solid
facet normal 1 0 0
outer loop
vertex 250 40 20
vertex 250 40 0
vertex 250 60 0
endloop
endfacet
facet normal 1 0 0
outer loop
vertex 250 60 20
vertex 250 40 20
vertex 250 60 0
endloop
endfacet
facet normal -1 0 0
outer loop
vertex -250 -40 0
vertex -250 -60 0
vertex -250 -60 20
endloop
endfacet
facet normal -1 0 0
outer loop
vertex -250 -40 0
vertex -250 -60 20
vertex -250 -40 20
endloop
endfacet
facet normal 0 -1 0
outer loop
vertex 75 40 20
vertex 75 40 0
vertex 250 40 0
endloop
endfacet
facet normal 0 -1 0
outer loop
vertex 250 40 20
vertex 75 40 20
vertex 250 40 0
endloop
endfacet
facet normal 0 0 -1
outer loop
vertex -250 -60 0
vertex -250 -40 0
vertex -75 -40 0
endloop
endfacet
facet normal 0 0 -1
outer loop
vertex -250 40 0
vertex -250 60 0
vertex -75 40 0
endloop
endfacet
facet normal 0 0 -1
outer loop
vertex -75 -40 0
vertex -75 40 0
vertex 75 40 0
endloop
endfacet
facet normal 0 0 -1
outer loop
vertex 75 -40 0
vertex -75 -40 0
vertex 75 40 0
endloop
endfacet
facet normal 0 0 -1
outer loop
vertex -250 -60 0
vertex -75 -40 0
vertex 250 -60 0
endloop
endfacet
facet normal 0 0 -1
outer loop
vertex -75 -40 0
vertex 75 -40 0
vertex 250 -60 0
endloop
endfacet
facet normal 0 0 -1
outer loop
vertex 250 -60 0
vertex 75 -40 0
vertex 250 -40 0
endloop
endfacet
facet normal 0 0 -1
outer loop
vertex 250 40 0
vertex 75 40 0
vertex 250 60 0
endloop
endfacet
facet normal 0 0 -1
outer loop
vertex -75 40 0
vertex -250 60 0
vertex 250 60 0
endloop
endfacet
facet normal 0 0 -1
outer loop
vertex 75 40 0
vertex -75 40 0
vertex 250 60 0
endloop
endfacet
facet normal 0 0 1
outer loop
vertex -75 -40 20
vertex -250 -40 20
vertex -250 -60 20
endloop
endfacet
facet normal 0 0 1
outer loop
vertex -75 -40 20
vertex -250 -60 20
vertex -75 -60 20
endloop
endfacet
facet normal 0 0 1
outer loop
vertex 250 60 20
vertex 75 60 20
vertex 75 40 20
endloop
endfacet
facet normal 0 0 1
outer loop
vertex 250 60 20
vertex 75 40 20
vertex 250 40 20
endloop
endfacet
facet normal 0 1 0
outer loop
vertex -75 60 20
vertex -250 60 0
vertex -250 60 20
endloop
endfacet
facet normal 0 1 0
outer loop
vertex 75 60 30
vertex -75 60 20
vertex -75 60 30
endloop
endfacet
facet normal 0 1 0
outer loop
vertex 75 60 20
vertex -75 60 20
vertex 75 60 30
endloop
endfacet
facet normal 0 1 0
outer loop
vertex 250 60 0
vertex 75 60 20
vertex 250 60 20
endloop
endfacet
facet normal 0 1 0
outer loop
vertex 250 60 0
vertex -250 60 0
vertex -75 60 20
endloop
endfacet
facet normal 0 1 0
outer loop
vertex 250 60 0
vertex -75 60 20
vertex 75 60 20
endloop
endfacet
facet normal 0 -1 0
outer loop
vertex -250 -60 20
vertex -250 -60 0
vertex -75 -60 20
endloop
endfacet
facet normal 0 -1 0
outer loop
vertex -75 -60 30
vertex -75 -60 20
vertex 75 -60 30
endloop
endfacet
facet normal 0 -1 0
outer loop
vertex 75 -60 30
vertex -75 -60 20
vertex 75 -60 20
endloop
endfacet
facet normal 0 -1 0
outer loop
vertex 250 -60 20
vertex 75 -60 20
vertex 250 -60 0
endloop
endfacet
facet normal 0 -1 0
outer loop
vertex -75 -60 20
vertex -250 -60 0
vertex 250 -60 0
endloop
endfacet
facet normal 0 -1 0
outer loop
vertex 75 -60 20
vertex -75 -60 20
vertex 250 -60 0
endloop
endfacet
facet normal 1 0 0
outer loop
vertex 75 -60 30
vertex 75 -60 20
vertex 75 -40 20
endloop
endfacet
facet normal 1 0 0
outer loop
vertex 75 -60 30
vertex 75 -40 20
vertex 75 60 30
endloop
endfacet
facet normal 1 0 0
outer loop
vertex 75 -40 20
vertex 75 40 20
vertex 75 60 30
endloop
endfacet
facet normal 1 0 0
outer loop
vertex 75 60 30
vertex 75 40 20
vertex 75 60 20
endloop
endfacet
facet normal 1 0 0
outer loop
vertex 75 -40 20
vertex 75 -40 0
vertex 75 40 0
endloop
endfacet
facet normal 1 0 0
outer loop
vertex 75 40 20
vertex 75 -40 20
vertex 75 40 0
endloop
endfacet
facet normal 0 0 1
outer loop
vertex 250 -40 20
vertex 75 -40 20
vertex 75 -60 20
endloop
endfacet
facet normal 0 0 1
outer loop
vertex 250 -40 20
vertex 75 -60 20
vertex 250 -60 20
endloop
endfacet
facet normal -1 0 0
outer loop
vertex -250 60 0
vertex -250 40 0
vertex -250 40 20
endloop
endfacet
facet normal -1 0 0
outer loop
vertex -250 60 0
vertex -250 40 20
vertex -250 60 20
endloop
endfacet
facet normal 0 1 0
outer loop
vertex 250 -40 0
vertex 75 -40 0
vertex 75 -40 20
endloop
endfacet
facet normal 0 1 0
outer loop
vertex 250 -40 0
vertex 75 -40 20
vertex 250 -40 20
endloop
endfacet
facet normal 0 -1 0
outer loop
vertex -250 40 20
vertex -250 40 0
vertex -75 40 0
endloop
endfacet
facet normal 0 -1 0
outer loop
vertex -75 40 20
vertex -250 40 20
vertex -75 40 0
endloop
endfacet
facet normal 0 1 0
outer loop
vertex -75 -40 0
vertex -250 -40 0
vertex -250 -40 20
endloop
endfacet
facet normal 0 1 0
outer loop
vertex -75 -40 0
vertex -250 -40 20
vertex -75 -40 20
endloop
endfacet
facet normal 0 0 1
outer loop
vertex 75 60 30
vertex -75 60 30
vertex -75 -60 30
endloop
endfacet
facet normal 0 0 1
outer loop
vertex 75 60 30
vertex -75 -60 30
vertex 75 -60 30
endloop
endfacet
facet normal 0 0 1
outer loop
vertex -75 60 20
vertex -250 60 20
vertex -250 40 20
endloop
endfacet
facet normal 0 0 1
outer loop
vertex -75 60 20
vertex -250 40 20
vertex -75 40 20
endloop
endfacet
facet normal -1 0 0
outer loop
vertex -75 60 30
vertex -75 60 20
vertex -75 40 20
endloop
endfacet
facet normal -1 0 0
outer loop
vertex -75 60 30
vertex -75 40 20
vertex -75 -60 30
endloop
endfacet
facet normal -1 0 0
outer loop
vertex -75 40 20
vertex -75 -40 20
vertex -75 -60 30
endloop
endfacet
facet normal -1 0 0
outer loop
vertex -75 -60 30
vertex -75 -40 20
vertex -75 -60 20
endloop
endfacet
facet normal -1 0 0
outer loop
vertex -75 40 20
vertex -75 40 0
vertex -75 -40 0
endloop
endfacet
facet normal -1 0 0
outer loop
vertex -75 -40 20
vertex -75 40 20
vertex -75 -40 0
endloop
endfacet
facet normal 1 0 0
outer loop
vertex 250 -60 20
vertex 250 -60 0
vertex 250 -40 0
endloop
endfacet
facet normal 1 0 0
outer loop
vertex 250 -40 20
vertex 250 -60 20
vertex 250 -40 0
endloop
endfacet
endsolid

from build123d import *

# Parameters (mm, degrees)
F0_W     = 175
F0_H     = 20
F0_W_2   = 150
F0_H_2   = 80
F1_DEPTH = 20
F2_W     = 150
F2_H     = 80
F2_H_2   = 20
F3_DEPTH = 10


with BuildPart() as f1:
    # F0 (on Top) → F1 (new body)
    with BuildSketch(Plane.XY):
        with Locations((-162.5, 50)):
            Rectangle(F0_W, F0_H)
        with Locations((162.5, 50)):
            Rectangle(F0_W, F0_H)
        with Locations((-162.5, -50)):
            Rectangle(F0_W, F0_H)
        with Locations((162.5, -50)):
            Rectangle(F0_W, F0_H)
        Rectangle(F0_W_2, F0_H_2)
        with Locations((0, -50)):
            Rectangle(F0_W_2, F0_H)
        with Locations((0, 50)):
            Rectangle(F0_W_2, F0_H)
    extrude(amount=F1_DEPTH)

    # F2 (on face) → F3 (join)
    with BuildSketch(Plane.XY.offset(20)):
        Rectangle(F2_W, F2_H)
        with Locations((0, 50)):
            Rectangle(F2_W, F2_H_2)
        with Locations((0, -50)):
            Rectangle(F2_W, F2_H_2)
    extrude(amount=F3_DEPTH)


solid = f1.part
